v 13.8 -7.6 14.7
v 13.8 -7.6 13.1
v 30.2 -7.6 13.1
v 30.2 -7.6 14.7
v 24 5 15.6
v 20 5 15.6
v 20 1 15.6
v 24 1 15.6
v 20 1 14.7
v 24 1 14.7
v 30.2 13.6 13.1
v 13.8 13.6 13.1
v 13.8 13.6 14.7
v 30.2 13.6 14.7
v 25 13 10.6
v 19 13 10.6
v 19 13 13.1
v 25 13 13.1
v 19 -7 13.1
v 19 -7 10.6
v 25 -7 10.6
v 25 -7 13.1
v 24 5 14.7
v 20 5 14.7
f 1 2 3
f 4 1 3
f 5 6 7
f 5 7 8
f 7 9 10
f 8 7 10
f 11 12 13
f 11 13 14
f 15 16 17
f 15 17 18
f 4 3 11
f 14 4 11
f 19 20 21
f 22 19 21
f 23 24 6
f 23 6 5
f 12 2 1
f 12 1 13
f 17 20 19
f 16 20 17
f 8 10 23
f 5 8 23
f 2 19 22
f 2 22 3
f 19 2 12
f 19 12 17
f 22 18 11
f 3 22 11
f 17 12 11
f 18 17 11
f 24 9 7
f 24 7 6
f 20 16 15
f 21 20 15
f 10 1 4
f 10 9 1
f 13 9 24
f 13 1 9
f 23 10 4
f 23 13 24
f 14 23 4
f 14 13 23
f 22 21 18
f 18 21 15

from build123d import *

# Parameters (mm, degrees)
SKETCH1_W           = 16.4
SKETCH1_H           = 21.2
BOSS_EXTRUDE1_DEPTH = 1.6
SKETCH2_W           = 6
SKETCH2_H           = 20
BOSS_EXTRUDE2_DEPTH = 2.5
SKETCH3_W           = 4
SKETCH3_H           = 4
BOSS_EXTRUDE3_DEPTH = 0.9


with BuildPart() as part:
    # Sketch1 → Boss-Extrude1 (new body)
    with BuildSketch(Plane.XY.offset(13.1)):
        with Locations((22, 3)):
            Rectangle(SKETCH1_W, SKETCH1_H)
    extrude(amount=BOSS_EXTRUDE1_DEPTH)

    # Sketch2 → Boss-Extrude2 (add)
    with BuildSketch(Plane.XY.offset(10.6)):
        with Locations((22, 3)):
            Rectangle(SKETCH2_W, SKETCH2_H)
    extrude(amount=BOSS_EXTRUDE2_DEPTH)

    # Sketch3 → Boss-Extrude3 (add)
    with BuildSketch(Plane.XY.offset(14.7)):
        with Locations((22, 3)):
            Rectangle(SKETCH3_W, SKETCH3_H)
    extrude(amount=BOSS_EXTRUDE3_DEPTH)


solid = part.part
